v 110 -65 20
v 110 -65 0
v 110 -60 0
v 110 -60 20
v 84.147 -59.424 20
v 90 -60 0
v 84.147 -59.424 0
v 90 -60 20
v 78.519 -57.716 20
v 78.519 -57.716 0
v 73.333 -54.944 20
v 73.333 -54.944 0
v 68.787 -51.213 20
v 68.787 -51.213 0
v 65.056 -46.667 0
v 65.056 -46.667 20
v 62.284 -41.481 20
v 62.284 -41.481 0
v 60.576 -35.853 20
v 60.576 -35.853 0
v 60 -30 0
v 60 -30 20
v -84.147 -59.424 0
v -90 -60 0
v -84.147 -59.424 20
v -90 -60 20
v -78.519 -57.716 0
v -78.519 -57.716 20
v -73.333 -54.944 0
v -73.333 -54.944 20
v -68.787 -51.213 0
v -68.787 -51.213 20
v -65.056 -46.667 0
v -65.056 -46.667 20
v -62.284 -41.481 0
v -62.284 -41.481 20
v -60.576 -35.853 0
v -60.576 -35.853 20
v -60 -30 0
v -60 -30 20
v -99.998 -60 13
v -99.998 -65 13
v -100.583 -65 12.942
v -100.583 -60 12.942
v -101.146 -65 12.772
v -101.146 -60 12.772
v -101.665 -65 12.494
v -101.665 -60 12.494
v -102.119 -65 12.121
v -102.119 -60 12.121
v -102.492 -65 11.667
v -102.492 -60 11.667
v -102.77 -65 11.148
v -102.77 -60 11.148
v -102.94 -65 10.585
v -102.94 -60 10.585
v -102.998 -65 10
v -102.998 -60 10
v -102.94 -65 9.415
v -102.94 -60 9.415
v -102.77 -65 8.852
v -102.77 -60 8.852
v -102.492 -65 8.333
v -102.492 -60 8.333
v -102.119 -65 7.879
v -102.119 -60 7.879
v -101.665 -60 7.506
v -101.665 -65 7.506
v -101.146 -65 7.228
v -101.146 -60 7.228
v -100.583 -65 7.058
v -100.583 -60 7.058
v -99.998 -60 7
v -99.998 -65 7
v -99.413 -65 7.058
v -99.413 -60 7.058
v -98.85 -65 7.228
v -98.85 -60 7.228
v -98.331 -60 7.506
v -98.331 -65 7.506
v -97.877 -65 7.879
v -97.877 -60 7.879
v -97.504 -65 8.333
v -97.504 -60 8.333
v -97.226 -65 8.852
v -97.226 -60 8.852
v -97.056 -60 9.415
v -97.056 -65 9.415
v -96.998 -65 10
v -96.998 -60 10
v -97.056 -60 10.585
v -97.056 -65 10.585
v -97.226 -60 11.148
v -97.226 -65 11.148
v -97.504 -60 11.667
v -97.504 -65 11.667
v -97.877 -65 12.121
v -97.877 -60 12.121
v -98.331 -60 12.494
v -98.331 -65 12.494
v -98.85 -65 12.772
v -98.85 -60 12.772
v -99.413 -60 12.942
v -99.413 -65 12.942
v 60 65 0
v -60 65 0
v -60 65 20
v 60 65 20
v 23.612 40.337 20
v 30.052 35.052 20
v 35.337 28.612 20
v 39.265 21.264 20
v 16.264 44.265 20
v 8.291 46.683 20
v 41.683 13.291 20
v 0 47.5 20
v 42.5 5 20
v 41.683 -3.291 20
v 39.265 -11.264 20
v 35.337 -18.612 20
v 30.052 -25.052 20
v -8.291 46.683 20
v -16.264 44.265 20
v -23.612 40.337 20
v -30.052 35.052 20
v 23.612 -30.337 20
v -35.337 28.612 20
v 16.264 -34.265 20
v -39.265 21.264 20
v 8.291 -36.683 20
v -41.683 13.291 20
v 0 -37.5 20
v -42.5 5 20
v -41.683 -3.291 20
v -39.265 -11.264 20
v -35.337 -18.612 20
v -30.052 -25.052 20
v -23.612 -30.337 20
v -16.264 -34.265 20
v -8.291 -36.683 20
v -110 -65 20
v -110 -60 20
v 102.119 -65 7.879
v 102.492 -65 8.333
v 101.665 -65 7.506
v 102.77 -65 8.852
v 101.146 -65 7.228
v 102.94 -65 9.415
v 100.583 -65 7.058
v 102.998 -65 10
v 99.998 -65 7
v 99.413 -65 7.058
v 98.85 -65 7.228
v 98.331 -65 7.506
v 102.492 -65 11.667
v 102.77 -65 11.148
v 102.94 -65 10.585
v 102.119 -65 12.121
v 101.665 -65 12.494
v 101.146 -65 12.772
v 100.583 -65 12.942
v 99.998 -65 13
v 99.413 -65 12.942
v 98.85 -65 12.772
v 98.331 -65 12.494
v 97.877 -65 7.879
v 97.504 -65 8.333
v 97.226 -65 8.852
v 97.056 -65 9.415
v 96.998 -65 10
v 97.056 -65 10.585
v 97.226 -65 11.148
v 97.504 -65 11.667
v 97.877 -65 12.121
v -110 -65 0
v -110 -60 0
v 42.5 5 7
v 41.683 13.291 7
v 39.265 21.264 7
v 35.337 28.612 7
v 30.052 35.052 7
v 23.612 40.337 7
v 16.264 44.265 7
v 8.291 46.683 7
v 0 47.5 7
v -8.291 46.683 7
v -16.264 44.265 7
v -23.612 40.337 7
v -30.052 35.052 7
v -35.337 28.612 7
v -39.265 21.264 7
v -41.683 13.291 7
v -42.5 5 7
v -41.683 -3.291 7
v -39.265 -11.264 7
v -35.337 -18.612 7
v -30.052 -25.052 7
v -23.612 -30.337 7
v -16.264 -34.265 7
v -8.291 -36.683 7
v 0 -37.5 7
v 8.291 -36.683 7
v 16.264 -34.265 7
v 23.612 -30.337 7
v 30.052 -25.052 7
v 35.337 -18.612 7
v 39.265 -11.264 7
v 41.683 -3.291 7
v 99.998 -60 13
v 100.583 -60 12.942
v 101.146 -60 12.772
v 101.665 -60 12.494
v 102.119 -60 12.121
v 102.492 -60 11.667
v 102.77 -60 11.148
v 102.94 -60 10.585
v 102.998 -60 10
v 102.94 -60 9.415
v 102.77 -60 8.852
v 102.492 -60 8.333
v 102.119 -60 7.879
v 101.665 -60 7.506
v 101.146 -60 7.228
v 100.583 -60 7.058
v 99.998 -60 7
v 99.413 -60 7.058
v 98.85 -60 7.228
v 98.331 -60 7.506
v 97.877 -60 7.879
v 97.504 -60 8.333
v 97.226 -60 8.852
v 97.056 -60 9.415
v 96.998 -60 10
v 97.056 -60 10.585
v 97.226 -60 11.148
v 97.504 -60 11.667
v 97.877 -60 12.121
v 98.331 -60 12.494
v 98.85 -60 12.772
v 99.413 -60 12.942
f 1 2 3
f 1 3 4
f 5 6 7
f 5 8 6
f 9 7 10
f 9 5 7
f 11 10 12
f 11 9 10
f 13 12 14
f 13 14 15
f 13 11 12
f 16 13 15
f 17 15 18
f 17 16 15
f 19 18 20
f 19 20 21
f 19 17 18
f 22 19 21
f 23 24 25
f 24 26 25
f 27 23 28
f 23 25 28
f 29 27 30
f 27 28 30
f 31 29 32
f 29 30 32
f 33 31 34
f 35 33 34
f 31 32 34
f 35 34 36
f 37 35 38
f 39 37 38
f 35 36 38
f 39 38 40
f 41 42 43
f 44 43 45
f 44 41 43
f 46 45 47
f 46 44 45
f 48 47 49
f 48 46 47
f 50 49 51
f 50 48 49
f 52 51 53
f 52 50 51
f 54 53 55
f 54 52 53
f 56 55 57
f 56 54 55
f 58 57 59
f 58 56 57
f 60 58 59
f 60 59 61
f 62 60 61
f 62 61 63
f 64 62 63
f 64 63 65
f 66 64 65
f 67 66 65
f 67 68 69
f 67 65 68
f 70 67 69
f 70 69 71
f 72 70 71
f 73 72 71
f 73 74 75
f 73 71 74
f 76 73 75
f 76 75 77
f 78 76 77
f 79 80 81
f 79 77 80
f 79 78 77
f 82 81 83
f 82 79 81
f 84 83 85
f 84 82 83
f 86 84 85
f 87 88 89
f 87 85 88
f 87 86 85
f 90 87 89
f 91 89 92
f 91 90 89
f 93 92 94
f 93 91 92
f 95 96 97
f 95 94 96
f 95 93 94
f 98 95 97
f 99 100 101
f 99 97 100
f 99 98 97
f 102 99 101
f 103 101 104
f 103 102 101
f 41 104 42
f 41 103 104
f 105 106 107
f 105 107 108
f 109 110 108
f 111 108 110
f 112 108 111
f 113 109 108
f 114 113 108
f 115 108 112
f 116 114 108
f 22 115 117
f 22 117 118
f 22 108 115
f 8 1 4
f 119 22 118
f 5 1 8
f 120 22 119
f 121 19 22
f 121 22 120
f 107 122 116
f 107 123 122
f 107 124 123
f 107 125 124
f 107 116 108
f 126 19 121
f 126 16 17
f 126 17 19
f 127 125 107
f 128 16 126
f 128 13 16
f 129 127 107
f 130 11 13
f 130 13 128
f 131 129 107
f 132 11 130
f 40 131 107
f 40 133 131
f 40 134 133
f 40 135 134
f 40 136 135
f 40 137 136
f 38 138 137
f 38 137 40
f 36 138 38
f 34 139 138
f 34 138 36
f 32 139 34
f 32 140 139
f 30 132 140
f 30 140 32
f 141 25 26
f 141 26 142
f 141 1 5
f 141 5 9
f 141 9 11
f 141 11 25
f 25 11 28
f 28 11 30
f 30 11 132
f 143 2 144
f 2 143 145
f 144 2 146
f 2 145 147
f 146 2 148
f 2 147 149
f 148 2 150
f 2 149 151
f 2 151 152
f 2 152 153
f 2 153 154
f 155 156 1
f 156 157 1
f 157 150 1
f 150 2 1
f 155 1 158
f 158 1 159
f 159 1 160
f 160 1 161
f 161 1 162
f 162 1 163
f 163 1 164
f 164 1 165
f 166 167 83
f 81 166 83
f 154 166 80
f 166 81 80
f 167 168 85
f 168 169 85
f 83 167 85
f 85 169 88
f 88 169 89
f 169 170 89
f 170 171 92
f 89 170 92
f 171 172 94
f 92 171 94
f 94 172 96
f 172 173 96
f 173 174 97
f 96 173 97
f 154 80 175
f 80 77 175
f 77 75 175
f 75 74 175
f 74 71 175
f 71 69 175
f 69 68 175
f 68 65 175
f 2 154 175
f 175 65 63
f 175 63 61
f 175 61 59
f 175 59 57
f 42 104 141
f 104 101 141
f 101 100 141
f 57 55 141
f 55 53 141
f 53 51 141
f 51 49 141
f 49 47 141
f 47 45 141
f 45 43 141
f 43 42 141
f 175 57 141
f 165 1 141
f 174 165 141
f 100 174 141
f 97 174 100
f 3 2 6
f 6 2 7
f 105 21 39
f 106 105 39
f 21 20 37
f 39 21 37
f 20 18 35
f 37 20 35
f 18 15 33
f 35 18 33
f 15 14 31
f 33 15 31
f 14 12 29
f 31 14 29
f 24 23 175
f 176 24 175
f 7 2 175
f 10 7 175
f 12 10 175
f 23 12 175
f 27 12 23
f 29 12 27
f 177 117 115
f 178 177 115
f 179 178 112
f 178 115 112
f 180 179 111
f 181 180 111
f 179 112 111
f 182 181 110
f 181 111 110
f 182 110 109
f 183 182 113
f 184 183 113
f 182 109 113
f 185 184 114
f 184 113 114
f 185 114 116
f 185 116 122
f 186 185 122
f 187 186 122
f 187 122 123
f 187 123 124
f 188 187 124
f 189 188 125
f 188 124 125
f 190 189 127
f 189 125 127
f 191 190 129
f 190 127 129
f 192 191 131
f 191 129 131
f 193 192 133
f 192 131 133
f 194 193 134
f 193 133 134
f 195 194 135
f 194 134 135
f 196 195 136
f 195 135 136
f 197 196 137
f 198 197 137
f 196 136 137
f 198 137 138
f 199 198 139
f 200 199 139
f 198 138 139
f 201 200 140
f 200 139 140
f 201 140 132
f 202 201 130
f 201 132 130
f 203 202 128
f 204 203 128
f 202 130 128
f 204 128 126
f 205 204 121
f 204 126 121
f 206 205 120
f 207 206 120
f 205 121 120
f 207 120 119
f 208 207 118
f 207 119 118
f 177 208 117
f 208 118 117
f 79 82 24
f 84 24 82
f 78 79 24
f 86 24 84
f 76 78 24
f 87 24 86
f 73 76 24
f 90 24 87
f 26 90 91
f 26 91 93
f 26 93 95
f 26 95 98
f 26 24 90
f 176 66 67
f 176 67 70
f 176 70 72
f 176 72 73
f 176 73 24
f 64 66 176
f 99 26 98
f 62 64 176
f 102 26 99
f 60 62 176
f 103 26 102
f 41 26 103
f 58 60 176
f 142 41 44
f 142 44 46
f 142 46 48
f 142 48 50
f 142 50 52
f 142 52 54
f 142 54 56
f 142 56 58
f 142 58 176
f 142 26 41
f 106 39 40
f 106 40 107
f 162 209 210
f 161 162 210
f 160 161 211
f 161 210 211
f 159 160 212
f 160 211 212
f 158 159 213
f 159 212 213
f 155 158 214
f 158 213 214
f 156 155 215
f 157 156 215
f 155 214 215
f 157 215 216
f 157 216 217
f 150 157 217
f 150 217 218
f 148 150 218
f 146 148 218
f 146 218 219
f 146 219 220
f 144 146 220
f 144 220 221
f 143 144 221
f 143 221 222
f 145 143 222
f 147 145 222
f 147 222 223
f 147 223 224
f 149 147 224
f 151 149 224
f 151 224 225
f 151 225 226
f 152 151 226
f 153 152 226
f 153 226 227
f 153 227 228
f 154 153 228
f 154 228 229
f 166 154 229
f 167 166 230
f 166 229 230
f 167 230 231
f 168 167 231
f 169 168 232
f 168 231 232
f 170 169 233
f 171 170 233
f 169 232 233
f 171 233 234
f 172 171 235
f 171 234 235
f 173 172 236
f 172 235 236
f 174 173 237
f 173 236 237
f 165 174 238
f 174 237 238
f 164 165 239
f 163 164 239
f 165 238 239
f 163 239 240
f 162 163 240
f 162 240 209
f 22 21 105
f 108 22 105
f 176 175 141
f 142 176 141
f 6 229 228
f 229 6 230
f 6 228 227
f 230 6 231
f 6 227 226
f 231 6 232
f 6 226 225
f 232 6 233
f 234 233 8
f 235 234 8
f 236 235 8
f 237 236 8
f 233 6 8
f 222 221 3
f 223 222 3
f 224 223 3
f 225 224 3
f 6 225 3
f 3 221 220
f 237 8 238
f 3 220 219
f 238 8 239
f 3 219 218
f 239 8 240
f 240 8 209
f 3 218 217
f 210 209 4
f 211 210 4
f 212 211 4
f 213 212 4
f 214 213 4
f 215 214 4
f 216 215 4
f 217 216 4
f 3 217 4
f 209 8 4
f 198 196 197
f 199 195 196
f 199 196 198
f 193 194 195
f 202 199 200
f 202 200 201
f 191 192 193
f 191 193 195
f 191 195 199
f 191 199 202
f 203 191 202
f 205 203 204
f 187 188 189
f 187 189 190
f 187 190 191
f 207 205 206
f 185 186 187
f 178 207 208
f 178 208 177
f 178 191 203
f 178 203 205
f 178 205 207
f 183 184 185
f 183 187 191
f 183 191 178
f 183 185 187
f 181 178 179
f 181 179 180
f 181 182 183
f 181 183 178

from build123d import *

# Parameters (mm, degrees)
SKETCH_1_W          = 120
SKETCH_1_H          = 130
EXTRUDE_1_DEPTH     = 20
SKETCH_2_R          = 42.5
CUT_EXTRUDE_1_DEPTH = 13
SKETCH_4_W          = 50
SKETCH_4_H          = 20
EXTRUDE_2_DEPTH     = 5
FILLET_2_R          = 30
FILLET_3_R          = 30
SKETCH_5_R          = 3
CUT_EXTRUDE_2_DEPTH = 168.705098312


with BuildPart() as part:
    # 草图1 → 凸台-拉伸1 (new body)
    with BuildSketch(Plane.XY):
        Rectangle(SKETCH_1_W, SKETCH_1_H)
    extrude(amount=EXTRUDE_1_DEPTH)

    # 草图2 → 切除-拉伸1 (cut)
    with BuildSketch(Plane.XY.offset(20)):
        with Locations((0, 5)):
            Circle(SKETCH_2_R)
    extrude(amount=-CUT_EXTRUDE_1_DEPTH, mode=Mode.SUBTRACT)

    # 草图4 → 凸台-拉伸2 (add)
    with BuildSketch(Plane.XZ.offset(65)):
        with Locations((85, 10)):
            Rectangle(SKETCH_4_W, SKETCH_4_H)
    extrude_2 = extrude(amount=-EXTRUDE_2_DEPTH)

    # 圆角2
    fillet_2_edges = [part.edges().sort_by_distance(p)[0] for p in [
        (60, -60, 10),
    ]]
    fillet(fillet_2_edges, radius=FILLET_2_R)

    # 镜向4: 凸台-拉伸2 across plane
    add(extrude_2.mirror(Plane(origin=(0, 0, 0), x_dir=(0, 0, 1), z_dir=(1, 0, 0))))

    # 圆角3
    fillet_3_edges = [part.edges().sort_by_distance(p)[0] for p in [
        (-60, -60, 10),
    ]]
    fillet(fillet_3_edges, radius=FILLET_3_R)

    # 草图5 → 切除-拉伸2 (cut, through all)
    with BuildSketch(Plane(origin=(0, -60, 0), x_dir=(1, 0, 0), z_dir=(0, 1, 0))):
        with Locations(Location((99.998041833, -10, 0), (0, 0, 270))):
            Circle(SKETCH_5_R)
    cut_extrude_2 = extrude(amount=-CUT_EXTRUDE_2_DEPTH, mode=Mode.SUBTRACT)

    # 镜向6: 切除-拉伸2 across plane
    add(cut_extrude_2.mirror(Plane(origin=(0, 0, 0), x_dir=(0, 0, 1), z_dir=(1, 0, 0))), mode=Mode.SUBTRACT)


solid = part.part
